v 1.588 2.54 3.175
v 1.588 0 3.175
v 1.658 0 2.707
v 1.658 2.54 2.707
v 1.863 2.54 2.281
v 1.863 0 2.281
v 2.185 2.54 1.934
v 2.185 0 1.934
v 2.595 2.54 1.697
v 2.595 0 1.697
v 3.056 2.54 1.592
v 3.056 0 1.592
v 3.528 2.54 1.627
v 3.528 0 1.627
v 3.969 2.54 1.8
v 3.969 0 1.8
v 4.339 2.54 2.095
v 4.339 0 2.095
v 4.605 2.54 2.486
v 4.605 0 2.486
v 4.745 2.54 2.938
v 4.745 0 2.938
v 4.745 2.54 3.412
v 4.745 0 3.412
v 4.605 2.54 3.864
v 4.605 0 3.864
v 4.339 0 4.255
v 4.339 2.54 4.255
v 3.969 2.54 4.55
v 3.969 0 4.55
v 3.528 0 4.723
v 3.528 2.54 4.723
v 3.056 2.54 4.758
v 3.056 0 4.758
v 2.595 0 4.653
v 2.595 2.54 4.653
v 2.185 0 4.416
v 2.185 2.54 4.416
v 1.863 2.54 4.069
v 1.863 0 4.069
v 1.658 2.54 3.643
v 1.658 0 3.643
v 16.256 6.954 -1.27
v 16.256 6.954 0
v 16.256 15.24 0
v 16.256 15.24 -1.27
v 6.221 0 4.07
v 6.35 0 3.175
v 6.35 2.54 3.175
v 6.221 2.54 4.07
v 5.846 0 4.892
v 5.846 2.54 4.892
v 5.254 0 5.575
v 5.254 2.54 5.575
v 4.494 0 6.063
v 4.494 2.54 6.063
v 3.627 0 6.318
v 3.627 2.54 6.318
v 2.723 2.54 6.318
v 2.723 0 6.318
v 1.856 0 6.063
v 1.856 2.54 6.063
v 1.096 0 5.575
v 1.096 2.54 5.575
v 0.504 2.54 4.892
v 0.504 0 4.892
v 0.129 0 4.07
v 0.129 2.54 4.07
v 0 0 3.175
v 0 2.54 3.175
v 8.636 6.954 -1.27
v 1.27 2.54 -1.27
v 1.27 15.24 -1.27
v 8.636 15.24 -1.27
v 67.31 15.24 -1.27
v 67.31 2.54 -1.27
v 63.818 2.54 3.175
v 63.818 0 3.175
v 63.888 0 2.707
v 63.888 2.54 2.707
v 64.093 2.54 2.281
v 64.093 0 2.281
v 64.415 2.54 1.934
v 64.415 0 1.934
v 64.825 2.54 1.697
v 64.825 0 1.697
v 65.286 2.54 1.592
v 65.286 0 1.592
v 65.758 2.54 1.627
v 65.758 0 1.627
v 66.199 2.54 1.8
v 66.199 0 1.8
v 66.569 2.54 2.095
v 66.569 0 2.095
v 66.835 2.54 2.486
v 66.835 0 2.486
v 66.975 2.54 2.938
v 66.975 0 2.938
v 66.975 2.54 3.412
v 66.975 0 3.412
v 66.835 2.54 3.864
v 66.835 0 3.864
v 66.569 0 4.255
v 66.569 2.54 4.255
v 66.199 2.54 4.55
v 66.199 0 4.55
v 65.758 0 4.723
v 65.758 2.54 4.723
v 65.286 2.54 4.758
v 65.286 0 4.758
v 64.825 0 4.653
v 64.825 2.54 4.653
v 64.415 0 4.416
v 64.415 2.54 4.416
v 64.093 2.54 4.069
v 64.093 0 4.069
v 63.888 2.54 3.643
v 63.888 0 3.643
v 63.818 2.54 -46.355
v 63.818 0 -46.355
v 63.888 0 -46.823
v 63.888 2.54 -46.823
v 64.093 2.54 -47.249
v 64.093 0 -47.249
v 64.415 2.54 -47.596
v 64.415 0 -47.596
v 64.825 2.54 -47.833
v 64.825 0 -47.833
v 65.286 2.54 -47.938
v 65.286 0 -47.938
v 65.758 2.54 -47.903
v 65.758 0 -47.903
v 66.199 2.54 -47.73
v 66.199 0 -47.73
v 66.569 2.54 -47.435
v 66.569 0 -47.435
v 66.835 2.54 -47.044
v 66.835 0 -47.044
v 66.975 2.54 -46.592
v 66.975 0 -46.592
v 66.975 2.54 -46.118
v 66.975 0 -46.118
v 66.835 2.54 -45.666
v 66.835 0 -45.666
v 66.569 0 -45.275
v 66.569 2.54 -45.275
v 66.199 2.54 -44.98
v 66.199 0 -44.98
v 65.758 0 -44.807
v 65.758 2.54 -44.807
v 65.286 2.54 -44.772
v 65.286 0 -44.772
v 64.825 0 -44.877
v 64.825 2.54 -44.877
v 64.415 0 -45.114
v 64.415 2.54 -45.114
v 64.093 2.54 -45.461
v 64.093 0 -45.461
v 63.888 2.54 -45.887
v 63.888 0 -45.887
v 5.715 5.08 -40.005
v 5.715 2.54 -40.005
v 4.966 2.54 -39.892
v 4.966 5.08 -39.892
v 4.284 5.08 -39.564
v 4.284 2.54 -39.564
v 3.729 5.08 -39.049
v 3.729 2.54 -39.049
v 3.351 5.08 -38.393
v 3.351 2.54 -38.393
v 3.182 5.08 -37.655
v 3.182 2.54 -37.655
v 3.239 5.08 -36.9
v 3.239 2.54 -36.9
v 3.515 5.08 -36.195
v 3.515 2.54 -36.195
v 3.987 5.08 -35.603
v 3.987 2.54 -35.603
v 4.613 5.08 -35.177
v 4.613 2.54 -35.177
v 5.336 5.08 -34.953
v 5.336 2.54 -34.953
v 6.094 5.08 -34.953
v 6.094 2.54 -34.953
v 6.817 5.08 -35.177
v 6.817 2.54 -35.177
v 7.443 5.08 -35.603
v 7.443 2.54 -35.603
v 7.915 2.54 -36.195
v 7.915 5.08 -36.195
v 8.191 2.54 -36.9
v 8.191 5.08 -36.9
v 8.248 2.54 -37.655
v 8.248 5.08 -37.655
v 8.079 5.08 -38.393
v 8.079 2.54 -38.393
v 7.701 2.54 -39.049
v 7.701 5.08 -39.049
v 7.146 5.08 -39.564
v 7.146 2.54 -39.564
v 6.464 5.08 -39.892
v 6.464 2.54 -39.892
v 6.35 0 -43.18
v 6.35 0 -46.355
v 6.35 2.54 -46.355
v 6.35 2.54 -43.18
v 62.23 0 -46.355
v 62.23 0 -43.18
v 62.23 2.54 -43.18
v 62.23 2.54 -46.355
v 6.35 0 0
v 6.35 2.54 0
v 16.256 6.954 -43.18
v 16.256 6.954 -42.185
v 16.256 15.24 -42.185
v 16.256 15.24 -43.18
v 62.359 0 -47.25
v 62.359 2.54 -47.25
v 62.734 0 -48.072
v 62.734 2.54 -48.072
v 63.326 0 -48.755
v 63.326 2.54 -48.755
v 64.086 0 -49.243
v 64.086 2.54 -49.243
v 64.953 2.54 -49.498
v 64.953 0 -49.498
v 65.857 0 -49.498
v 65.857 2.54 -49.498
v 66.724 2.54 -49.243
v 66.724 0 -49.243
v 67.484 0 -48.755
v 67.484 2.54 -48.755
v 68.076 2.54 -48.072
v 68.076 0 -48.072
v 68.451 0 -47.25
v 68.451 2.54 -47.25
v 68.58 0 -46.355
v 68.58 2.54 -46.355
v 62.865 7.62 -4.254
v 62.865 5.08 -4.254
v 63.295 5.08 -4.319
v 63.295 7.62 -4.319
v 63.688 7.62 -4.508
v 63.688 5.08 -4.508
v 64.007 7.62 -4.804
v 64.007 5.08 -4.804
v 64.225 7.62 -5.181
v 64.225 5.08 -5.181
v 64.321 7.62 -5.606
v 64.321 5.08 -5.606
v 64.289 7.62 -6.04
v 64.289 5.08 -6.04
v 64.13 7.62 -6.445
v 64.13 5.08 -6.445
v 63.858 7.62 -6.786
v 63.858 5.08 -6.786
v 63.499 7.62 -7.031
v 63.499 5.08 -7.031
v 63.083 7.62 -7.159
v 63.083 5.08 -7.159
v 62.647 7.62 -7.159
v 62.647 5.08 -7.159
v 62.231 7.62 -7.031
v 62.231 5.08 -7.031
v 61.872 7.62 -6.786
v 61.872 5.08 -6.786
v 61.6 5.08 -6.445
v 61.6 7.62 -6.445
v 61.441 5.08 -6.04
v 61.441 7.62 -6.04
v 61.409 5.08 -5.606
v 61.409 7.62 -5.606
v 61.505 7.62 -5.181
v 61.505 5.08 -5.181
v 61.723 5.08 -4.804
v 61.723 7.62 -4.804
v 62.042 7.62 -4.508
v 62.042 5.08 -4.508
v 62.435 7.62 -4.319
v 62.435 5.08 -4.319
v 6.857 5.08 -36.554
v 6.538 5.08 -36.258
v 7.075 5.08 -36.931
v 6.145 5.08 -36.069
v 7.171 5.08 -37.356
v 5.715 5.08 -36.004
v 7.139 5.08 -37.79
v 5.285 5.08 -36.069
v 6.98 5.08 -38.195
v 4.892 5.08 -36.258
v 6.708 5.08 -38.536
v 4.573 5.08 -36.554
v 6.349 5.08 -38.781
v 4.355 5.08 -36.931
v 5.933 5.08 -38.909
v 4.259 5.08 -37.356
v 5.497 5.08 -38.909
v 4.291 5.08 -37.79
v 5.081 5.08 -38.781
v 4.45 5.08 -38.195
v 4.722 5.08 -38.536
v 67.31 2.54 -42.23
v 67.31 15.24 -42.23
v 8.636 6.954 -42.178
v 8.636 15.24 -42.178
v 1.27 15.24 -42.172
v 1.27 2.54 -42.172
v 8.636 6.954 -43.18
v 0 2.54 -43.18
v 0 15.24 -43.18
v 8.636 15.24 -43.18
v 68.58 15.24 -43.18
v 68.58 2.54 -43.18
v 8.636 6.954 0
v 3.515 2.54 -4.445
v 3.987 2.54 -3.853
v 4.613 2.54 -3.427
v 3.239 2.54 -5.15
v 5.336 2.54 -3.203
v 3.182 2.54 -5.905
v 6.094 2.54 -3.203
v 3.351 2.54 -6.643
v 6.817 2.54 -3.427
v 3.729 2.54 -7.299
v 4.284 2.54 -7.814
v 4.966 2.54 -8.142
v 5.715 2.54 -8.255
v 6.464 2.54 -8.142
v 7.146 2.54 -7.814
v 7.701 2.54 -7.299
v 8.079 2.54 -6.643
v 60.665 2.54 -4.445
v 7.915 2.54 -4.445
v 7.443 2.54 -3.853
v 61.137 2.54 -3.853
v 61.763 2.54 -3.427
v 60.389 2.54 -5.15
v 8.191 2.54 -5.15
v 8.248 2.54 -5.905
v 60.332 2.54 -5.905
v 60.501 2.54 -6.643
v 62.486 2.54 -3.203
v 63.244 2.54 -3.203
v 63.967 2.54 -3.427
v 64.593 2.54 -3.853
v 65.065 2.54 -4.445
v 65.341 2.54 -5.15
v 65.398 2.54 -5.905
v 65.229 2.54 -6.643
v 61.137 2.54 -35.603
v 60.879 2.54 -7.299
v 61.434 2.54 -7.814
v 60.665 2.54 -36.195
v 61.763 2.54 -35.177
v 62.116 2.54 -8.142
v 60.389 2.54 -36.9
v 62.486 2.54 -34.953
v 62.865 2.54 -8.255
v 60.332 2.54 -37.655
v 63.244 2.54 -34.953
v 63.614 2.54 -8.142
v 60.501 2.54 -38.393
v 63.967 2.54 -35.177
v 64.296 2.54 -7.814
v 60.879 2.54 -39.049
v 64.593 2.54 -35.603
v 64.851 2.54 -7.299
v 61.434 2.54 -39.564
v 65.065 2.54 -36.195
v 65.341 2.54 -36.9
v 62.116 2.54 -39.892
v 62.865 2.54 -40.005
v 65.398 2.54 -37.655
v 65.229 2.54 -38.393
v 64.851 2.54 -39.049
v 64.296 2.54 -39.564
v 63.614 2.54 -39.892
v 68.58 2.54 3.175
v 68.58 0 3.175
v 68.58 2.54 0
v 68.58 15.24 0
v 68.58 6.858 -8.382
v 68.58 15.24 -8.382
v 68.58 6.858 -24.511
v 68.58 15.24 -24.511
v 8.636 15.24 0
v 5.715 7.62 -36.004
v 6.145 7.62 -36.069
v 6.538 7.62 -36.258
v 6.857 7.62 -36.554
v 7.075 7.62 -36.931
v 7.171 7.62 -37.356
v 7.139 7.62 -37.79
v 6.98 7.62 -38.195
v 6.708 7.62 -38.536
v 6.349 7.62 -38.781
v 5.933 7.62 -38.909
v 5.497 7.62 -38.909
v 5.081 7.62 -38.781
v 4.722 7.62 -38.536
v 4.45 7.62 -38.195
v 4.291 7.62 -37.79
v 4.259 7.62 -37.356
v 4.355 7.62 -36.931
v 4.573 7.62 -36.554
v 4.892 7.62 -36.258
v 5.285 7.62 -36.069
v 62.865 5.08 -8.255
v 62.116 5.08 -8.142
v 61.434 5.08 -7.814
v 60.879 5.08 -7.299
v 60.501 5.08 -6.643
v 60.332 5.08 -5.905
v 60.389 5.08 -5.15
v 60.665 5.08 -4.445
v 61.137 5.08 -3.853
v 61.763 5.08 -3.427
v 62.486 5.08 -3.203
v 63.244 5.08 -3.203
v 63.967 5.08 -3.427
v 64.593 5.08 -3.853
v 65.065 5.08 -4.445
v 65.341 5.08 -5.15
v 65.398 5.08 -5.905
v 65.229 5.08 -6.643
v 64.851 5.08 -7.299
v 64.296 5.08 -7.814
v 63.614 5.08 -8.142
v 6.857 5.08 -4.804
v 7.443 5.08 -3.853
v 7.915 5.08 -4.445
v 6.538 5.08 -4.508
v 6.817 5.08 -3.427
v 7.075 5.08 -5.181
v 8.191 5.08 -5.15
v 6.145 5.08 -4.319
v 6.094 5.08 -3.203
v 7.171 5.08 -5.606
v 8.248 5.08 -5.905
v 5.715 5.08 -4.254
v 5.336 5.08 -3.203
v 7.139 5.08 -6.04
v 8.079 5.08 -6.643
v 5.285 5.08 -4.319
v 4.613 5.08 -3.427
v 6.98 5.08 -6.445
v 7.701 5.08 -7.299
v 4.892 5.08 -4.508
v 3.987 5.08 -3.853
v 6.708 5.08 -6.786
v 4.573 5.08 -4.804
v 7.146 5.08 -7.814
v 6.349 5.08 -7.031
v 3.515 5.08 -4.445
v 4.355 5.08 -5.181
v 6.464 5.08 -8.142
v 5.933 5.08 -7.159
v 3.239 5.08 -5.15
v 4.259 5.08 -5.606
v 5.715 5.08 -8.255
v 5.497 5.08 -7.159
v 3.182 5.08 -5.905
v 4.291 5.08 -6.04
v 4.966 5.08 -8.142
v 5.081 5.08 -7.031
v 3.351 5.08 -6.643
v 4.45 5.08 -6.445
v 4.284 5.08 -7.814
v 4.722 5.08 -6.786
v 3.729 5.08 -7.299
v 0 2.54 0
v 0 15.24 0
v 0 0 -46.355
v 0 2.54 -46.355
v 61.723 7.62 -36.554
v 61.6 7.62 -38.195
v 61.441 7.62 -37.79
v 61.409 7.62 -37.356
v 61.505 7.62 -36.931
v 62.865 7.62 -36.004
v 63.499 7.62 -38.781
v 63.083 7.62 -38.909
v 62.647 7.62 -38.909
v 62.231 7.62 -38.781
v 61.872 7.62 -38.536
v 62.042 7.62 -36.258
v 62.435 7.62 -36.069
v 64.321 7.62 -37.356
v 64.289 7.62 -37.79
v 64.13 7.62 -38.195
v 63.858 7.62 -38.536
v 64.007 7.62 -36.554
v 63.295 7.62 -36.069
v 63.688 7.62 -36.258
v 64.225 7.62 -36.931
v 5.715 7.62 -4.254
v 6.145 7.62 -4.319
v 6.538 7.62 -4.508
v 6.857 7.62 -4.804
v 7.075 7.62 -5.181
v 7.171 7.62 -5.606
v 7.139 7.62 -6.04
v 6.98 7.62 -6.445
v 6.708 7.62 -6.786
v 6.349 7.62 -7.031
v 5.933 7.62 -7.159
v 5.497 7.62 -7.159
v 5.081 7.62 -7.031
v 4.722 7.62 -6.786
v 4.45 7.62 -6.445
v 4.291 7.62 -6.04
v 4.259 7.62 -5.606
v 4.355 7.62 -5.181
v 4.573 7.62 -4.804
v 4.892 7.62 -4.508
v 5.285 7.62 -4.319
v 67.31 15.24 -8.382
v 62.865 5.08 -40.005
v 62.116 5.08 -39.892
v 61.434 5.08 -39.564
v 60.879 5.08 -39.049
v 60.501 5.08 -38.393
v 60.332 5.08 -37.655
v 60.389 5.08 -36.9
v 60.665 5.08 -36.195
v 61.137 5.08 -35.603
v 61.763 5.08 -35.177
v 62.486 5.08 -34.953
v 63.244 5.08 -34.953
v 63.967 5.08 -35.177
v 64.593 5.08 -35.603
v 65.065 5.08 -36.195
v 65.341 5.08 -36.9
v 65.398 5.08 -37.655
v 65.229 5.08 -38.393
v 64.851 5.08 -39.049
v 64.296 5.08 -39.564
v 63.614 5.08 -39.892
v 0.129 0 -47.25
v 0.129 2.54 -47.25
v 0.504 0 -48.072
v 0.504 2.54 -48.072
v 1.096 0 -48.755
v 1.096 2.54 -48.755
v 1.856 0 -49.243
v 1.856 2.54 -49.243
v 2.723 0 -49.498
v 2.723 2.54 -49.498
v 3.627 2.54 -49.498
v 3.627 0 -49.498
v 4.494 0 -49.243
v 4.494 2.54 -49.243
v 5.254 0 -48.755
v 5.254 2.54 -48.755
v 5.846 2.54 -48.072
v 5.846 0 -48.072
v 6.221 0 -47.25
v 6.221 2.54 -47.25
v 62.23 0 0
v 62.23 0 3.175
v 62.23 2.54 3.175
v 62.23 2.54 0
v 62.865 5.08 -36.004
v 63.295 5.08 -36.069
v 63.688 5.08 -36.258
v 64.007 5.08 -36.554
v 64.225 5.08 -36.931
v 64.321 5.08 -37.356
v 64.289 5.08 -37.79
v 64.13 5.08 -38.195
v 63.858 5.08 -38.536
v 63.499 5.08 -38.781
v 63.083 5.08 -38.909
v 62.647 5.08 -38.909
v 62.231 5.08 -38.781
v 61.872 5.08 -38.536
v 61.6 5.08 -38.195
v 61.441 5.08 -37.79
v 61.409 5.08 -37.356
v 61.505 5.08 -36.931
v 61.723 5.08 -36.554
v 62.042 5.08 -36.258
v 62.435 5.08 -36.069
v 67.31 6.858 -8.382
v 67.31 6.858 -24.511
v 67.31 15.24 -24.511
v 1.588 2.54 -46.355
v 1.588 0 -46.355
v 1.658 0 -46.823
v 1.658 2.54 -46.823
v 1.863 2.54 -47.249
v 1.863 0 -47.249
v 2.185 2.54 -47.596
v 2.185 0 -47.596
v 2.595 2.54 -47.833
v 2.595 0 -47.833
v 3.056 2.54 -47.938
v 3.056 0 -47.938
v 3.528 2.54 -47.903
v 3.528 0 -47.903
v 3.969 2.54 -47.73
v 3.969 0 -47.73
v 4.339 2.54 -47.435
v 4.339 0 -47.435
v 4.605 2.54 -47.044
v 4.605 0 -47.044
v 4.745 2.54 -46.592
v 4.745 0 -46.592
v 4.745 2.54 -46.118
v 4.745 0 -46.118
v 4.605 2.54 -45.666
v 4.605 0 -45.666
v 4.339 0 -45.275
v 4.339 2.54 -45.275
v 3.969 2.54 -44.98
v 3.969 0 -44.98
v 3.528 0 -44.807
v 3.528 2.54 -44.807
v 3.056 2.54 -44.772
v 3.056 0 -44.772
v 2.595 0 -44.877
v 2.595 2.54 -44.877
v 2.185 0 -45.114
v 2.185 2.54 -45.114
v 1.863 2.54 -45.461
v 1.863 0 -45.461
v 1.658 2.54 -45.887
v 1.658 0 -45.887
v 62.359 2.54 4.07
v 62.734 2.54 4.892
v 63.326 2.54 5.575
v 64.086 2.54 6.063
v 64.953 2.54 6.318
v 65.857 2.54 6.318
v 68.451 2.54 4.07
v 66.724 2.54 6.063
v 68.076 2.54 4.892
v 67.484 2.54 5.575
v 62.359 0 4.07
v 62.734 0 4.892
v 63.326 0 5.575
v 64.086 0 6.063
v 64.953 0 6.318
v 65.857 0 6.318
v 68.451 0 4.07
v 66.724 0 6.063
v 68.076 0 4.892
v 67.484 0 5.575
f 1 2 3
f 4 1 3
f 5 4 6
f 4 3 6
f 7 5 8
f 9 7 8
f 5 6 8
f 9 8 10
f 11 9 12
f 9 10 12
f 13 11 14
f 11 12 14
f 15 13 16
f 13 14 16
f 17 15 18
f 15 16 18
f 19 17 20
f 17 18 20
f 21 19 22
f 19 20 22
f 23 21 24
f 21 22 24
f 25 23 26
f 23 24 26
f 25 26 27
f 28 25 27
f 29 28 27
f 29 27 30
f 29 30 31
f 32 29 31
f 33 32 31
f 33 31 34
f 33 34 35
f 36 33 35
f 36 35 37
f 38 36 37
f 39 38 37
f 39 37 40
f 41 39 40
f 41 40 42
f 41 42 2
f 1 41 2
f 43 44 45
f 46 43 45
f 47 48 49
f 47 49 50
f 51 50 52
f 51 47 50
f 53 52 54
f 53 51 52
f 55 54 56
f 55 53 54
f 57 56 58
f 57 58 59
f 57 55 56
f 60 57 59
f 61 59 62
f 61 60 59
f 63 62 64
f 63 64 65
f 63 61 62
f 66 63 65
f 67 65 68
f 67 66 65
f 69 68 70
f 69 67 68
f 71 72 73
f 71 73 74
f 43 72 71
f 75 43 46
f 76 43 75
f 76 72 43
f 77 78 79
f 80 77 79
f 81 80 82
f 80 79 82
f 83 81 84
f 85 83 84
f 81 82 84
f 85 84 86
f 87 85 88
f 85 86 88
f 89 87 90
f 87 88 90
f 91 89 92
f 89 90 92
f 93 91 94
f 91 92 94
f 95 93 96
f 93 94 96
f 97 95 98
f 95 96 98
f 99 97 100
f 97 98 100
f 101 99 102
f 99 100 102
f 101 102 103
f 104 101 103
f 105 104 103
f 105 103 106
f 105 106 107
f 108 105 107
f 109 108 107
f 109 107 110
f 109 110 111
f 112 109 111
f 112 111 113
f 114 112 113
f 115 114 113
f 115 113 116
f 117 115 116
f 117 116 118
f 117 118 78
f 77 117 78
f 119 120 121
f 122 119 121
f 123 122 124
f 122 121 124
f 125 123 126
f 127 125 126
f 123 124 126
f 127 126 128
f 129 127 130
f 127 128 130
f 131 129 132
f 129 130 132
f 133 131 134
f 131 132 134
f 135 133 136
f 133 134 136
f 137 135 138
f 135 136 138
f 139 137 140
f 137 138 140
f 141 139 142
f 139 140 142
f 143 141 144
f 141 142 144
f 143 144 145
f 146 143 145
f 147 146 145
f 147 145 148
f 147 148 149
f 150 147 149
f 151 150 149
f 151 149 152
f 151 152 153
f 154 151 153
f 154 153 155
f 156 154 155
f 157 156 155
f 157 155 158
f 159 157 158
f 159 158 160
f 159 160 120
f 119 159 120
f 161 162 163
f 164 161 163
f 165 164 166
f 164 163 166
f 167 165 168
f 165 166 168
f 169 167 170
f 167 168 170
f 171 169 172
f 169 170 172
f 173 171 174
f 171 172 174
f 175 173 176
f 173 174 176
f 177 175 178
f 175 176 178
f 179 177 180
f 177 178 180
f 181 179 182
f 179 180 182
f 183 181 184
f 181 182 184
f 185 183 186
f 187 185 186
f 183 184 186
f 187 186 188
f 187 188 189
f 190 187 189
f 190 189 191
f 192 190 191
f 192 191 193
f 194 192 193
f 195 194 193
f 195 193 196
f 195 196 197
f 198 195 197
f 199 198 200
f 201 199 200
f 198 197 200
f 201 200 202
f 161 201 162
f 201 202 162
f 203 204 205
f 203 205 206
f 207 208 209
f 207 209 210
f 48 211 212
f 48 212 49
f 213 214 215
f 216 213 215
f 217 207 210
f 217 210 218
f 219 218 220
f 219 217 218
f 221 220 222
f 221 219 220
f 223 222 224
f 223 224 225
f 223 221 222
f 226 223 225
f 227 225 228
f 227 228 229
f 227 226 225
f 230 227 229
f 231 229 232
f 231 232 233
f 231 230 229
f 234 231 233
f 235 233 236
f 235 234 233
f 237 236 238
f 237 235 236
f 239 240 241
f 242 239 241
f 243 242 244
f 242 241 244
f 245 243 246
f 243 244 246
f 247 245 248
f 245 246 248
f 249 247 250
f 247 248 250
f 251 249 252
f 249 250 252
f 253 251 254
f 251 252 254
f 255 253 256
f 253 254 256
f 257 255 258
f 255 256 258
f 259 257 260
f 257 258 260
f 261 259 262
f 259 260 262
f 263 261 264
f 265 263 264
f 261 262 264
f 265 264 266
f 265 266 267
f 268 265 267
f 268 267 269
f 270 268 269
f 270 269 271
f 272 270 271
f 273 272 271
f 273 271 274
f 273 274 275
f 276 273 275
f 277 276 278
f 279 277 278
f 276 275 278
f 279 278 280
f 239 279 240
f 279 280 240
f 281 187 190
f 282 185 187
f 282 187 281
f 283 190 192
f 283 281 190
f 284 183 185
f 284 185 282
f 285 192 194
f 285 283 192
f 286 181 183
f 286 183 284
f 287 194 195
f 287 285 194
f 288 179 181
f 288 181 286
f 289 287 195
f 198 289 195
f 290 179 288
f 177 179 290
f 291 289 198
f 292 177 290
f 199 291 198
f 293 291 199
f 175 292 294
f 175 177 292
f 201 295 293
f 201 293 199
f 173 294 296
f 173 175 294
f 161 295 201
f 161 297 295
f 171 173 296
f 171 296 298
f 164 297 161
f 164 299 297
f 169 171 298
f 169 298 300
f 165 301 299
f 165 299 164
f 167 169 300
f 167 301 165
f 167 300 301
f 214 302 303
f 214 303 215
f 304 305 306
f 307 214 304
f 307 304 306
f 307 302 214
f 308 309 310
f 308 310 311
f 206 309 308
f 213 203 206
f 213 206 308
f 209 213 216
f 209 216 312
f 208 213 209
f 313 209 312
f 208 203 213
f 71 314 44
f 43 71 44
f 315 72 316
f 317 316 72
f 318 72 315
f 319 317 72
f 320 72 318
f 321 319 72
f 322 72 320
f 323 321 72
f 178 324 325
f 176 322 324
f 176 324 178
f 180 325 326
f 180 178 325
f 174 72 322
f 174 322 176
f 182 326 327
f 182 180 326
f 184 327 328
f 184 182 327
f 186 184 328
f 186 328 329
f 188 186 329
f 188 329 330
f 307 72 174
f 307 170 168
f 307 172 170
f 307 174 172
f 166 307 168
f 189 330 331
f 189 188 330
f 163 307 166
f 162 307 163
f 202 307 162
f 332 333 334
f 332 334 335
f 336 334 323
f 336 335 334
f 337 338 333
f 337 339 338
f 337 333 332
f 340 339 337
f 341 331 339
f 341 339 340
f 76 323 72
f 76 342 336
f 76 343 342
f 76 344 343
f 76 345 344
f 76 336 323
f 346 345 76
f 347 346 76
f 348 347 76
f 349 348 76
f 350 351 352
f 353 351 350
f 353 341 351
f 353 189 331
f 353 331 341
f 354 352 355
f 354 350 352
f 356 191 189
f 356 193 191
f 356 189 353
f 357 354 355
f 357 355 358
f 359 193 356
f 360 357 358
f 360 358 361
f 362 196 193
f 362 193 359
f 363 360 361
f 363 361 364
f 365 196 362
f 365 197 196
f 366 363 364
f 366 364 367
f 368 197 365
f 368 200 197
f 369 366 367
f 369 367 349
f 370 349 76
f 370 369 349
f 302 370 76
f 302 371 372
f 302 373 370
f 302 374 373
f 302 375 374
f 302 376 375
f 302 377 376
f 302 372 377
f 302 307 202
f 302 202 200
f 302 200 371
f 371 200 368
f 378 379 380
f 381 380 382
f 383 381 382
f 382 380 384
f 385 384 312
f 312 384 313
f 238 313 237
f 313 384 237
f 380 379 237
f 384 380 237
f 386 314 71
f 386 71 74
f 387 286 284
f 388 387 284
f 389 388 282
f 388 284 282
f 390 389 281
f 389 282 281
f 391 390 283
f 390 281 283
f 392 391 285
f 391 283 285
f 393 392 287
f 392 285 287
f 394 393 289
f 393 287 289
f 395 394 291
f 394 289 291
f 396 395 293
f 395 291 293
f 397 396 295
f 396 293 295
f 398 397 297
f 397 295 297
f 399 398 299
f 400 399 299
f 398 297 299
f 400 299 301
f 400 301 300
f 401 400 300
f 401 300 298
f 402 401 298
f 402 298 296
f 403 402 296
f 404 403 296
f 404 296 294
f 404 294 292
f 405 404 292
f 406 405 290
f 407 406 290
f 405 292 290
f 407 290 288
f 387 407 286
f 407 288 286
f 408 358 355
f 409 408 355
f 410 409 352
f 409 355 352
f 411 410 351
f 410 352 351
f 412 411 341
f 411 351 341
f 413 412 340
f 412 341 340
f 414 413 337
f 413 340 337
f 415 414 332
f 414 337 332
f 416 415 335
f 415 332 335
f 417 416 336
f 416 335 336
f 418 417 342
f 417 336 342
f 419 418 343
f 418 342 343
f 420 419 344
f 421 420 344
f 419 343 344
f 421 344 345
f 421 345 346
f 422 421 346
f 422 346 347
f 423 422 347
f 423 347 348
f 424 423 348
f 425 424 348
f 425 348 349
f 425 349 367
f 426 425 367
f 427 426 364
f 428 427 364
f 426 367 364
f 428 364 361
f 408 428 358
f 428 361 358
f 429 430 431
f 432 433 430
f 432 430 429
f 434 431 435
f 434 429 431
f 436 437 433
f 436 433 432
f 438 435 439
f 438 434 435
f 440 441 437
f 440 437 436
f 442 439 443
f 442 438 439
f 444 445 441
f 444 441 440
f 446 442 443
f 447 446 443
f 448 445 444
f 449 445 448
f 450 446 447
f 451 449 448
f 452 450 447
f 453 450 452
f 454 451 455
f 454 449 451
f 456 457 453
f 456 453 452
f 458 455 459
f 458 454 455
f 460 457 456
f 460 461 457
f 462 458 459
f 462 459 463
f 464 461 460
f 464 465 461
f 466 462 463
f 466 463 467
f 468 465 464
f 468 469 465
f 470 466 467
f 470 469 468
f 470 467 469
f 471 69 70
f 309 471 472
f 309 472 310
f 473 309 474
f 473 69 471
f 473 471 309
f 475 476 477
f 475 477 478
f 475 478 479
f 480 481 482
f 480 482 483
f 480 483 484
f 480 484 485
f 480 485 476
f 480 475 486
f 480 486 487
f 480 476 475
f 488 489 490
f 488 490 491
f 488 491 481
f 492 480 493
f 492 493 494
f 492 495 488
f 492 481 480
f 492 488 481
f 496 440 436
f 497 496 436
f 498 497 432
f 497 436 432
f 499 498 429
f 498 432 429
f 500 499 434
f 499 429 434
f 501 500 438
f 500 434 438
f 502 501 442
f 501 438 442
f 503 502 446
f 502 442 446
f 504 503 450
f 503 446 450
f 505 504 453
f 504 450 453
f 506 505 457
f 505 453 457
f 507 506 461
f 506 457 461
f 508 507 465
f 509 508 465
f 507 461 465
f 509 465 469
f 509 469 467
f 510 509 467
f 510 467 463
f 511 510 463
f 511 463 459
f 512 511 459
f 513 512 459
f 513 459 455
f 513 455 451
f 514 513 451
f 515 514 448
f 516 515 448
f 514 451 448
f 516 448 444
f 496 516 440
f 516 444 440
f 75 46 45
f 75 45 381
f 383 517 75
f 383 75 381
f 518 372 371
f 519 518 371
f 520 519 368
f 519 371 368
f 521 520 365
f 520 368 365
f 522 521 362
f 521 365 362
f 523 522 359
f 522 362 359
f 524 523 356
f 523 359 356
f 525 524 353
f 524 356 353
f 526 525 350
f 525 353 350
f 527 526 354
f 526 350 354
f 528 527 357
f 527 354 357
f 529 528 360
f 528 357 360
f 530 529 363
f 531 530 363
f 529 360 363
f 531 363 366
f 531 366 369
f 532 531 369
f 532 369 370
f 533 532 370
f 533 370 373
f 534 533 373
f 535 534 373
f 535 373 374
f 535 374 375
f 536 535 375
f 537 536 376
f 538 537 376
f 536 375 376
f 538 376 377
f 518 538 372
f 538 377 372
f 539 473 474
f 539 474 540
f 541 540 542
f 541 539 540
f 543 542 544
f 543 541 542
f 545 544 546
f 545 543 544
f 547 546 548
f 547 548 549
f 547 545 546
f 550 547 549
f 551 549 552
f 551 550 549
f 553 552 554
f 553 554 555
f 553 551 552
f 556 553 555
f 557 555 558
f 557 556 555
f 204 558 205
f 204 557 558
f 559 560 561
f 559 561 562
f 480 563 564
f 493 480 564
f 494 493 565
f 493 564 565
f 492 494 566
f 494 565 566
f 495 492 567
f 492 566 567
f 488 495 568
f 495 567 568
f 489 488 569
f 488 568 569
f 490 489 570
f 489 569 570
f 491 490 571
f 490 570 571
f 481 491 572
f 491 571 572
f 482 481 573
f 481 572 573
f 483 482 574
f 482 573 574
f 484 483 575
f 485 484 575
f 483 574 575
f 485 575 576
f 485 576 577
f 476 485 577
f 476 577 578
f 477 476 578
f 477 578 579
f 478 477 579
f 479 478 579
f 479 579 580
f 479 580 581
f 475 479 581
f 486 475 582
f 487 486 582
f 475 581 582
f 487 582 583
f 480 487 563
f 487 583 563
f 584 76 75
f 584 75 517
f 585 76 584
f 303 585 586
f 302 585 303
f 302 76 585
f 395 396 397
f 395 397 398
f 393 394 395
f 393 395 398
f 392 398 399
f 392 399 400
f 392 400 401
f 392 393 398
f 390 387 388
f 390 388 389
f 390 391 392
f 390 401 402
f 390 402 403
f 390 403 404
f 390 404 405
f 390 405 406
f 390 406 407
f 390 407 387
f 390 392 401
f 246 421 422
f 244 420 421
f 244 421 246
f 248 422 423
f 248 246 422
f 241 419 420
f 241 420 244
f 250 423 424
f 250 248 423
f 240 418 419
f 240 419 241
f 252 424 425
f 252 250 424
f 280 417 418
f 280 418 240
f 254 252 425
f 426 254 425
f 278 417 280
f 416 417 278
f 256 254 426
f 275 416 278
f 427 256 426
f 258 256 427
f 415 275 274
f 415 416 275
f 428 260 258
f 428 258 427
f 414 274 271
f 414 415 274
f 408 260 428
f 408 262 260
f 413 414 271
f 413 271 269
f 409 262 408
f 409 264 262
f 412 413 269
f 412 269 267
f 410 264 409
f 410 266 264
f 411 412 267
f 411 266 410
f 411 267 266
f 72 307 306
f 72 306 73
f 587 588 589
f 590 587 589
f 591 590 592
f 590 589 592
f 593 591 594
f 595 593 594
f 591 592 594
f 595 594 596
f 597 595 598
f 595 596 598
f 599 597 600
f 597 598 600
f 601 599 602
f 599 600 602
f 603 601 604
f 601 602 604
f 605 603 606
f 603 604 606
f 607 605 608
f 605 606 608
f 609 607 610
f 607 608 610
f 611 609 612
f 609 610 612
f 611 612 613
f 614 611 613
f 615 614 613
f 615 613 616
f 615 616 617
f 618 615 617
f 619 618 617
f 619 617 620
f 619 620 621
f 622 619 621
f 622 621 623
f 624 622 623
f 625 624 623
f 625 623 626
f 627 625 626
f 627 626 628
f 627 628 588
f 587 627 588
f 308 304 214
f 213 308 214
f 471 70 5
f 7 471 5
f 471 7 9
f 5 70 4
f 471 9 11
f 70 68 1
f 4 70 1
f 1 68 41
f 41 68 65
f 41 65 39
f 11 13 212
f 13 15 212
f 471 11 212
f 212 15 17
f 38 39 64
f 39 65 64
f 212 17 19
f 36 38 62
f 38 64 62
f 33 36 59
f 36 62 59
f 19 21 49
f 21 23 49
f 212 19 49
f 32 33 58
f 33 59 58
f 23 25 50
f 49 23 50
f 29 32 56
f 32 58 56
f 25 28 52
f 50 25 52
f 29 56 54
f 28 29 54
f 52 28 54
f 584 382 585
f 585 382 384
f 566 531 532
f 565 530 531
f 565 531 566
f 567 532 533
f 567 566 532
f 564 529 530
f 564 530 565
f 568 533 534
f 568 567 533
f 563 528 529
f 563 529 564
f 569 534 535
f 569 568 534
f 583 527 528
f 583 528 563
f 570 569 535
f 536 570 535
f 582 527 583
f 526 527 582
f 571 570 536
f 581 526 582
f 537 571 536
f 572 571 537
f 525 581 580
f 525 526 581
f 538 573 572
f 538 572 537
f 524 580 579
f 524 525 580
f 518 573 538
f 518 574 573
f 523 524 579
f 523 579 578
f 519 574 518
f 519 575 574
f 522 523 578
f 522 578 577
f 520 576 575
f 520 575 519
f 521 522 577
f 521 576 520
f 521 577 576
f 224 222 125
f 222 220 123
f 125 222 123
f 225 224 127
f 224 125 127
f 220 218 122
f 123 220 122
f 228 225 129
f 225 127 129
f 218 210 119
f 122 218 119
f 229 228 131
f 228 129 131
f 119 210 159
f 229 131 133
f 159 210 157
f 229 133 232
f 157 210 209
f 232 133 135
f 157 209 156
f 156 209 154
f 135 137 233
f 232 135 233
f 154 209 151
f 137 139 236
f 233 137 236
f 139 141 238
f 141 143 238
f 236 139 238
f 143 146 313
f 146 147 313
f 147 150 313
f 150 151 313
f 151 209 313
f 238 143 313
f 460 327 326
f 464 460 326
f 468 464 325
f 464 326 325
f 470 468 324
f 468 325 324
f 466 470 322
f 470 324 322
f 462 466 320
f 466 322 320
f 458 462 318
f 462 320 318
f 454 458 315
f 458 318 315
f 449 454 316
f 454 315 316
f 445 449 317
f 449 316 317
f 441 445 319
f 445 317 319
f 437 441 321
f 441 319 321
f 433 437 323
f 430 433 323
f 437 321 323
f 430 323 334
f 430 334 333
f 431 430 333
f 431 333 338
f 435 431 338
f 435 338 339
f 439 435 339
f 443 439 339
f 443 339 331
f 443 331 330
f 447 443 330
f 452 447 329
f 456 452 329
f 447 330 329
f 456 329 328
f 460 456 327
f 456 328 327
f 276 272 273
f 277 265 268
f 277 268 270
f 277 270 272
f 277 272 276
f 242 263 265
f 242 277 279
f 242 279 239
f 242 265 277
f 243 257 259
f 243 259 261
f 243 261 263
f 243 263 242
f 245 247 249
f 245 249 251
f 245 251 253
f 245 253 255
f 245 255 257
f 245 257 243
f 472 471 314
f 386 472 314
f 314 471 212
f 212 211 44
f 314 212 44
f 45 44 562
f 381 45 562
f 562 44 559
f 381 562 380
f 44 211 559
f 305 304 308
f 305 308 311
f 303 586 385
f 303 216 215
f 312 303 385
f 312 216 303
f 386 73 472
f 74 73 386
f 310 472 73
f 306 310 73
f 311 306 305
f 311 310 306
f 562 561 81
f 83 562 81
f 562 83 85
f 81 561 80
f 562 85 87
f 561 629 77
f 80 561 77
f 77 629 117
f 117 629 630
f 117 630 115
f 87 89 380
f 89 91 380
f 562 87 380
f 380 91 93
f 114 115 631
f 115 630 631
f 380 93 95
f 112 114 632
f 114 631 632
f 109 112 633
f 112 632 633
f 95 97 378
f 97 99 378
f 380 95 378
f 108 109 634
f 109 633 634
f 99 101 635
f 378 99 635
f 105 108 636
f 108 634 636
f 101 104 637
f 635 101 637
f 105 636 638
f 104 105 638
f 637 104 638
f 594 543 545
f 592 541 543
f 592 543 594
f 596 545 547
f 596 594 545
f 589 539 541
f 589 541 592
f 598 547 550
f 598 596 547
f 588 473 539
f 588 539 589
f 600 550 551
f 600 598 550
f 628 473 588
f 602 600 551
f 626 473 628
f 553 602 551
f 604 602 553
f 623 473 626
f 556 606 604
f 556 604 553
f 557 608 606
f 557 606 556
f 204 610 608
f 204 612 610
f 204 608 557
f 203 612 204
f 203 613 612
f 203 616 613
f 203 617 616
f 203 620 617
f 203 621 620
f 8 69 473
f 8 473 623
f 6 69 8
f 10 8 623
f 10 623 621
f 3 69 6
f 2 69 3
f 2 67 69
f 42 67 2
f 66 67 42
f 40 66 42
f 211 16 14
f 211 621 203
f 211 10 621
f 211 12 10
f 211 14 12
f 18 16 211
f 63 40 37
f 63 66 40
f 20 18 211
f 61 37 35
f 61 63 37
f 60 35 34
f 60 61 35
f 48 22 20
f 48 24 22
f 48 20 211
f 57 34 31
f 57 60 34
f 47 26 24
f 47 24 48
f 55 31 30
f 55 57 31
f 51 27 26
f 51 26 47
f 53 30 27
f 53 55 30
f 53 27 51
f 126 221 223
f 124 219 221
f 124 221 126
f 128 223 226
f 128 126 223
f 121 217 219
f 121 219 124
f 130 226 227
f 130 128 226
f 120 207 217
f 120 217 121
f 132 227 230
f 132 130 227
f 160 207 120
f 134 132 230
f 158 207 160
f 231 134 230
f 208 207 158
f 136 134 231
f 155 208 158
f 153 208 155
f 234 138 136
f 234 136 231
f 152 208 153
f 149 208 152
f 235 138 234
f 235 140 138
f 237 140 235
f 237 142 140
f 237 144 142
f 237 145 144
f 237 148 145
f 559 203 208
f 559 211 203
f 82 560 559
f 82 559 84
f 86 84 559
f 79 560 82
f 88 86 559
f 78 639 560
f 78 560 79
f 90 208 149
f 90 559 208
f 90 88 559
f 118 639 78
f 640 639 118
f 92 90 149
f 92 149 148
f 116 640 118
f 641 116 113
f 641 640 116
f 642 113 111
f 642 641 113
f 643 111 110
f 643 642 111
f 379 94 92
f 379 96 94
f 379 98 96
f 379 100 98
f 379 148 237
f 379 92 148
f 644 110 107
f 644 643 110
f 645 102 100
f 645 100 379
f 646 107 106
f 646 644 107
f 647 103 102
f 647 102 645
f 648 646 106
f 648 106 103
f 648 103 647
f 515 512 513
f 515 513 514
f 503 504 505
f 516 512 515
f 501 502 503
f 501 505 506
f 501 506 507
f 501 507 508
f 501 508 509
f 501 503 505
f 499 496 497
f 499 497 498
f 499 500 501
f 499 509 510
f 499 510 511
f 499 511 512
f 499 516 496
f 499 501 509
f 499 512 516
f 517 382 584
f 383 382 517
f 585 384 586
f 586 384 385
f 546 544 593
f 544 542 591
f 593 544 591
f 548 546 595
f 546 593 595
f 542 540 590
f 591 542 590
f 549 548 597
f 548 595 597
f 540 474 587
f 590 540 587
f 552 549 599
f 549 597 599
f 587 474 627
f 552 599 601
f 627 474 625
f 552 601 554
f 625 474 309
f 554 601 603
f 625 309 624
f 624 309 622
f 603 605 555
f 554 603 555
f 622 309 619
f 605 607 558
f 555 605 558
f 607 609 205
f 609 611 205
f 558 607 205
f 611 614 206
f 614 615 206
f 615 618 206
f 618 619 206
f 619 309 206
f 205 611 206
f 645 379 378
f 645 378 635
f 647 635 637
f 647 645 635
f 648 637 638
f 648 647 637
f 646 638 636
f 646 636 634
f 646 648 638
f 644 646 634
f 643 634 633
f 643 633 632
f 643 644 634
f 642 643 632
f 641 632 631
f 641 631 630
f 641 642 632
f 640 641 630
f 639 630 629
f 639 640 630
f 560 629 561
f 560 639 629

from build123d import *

# Parameters (mm, degrees)
SKETCH1_W                    = 68.58
SKETCH1_H                    = 43.18
BOSS_EXTRUDE1_DEPTH          = 2.54
SKETCH5_R                    = 2.54
BOSS_EXTRUDE2_DEPTH          = 2.54
SKETCH6_W                    = 68.58
SKETCH6_H                    = 43.18
BOSS_EXTRUDE3_DEPTH          = 12.7
SKETCH7_R                    = 1.4605
BOSS_EXTRUDE4_DEPTH          = 2.54
SKETCH8_W                    = 7.62
SKETCH8_H                    = 8.2856324
CUT_EXTRUDE1_DEPTH           = 83.46203005
SKETCH9_W                    = 16.129
SKETCH9_H                    = 8.382
CUT_EXTRUDE2_DEPTH           = 2.032
BOSS_EXTRUDE5_DEPTH          = 2.54
F_1_8_0_125_DIAMETER_HOLE1_D = 3.175


with BuildPart() as part:
    # Sketch1 → Boss-Extrude1 (new body)
    with BuildSketch(Plane(origin=(0, 0, 0), x_dir=(1, 0, 0), z_dir=(0, 1, 0))):
        with Locations((34.29, 21.59)):
            Rectangle(SKETCH1_W, SKETCH1_H)
    extrude(amount=BOSS_EXTRUDE1_DEPTH)

    # Sketch5 → Boss-Extrude2 (add)
    with BuildSketch(Plane(origin=(0, 2.54, 0), x_dir=(1, 0, 0), z_dir=(0, 1, 0))):
        with Locations(Location((5.715, 37.465, 0), (0, 0, 90))):
            Circle(SKETCH5_R)
        with Locations(Location((62.865, 37.465, 0), (0, 0, 90))):
            Circle(SKETCH5_R)
        with Locations(Location((5.715, 5.715, 0), (0, 0, 90))):
            Circle(SKETCH5_R)
        with Locations(Location((62.865, 5.715, 0), (0, 0, 90))):
            Circle(SKETCH5_R)
    extrude(amount=BOSS_EXTRUDE2_DEPTH)

    # Sketch6 → Boss-Extrude3 (add)
    with BuildSketch(Plane(origin=(0, 2.54, 0), x_dir=(1, 0, 0), z_dir=(0, 1, 0))):
        with Locations((34.29, 21.59)):
            Rectangle(SKETCH6_W, SKETCH6_H)
        Polygon((1.27, 42.171922196), (1.27, 1.27), (67.31, 1.27), (67.31, 42.229552983), align=None, mode=Mode.SUBTRACT)
    extrude(amount=BOSS_EXTRUDE3_DEPTH)

    # Sketch7 → Boss-Extrude4 (add)
    with BuildSketch(Plane(origin=(0, 5.08, 0), x_dir=(1, 0, 0), z_dir=(0, 1, 0))):
        with Locations(Location((5.715, 37.465, 0), (0, 0, 270))):
            Circle(SKETCH7_R)
        with Locations(Location((5.715, 5.715, 0), (0, 0, 270))):
            Circle(SKETCH7_R)
        with Locations(Location((62.865, 5.715, 0), (0, 0, 270))):
            Circle(SKETCH7_R)
        with Locations(Location((62.865, 37.465, 0), (0, 0, 270))):
            Circle(SKETCH7_R)
    extrude(amount=BOSS_EXTRUDE4_DEPTH)

    # Sketch8 → Cut-Extrude1 (cut, through all)
    with BuildSketch(Plane.XY):
        with Locations((12.446, 11.0971838)):
            Rectangle(SKETCH8_W, SKETCH8_H)
    extrude(amount=-CUT_EXTRUDE1_DEPTH, mode=Mode.SUBTRACT)

    # Sketch9 → Cut-Extrude2 (cut)
    with BuildSketch(Plane(origin=(68.58, 0, 0), x_dir=(0, 0, -1), z_dir=(1, 0, 0))):
        with Locations((16.4465, 11.049)):
            Rectangle(SKETCH9_W, SKETCH9_H)
    extrude(amount=-CUT_EXTRUDE2_DEPTH, mode=Mode.SUBTRACT)

    # Sketch10 → Boss-Extrude5 (add)
    with BuildSketch(Plane.XZ):
        with BuildLine():
            Line((0, 3.175), (0, 0))
            Line((0, 0), (6.35, 0))
            Line((6.35, 0), (6.35, 3.175))
            ThreePointArc((6.35, 3.175), (3.175, 6.35), (0, 3.175))
        make_face()
        with BuildLine():
            Line((6.35, -46.355), (6.35, -43.18))
            Line((6.35, -43.18), (0, -43.18))
            Line((0, -43.18), (0, -46.355))
            ThreePointArc((0, -46.355), (3.175, -49.53), (6.35, -46.355))
        make_face()
        with BuildLine():
            Line((68.58, -46.355), (68.58, -43.18))
            Line((68.58, -43.18), (62.23, -43.18))
            Line((62.23, -43.18), (62.23, -46.355))
            ThreePointArc((62.23, -46.355), (65.405, -49.53), (68.58, -46.355))
        make_face()
        with BuildLine():
            Line((62.23, 3.175), (62.23, 0))
            Line((62.23, 0), (68.58, 0))
            Line((68.58, 0), (68.58, 3.175))
            ThreePointArc((68.58, 3.175), (65.405, 6.35), (62.23, 3.175))
        make_face()
    extrude(amount=-BOSS_EXTRUDE5_DEPTH)

    # 1/8 (0.125) Diameter Hole1 (through all)
    with Locations(Plane(origin=(0, 2.54, 0), x_dir=(1, 0, 0), z_dir=(0, 1, 0))):
        with Locations((65.405, 46.355), (3.175, 46.355), (3.175, -3.175), (65.405, -3.175)):
            Hole(F_1_8_0_125_DIAMETER_HOLE1_D / 2)


solid = part.part
